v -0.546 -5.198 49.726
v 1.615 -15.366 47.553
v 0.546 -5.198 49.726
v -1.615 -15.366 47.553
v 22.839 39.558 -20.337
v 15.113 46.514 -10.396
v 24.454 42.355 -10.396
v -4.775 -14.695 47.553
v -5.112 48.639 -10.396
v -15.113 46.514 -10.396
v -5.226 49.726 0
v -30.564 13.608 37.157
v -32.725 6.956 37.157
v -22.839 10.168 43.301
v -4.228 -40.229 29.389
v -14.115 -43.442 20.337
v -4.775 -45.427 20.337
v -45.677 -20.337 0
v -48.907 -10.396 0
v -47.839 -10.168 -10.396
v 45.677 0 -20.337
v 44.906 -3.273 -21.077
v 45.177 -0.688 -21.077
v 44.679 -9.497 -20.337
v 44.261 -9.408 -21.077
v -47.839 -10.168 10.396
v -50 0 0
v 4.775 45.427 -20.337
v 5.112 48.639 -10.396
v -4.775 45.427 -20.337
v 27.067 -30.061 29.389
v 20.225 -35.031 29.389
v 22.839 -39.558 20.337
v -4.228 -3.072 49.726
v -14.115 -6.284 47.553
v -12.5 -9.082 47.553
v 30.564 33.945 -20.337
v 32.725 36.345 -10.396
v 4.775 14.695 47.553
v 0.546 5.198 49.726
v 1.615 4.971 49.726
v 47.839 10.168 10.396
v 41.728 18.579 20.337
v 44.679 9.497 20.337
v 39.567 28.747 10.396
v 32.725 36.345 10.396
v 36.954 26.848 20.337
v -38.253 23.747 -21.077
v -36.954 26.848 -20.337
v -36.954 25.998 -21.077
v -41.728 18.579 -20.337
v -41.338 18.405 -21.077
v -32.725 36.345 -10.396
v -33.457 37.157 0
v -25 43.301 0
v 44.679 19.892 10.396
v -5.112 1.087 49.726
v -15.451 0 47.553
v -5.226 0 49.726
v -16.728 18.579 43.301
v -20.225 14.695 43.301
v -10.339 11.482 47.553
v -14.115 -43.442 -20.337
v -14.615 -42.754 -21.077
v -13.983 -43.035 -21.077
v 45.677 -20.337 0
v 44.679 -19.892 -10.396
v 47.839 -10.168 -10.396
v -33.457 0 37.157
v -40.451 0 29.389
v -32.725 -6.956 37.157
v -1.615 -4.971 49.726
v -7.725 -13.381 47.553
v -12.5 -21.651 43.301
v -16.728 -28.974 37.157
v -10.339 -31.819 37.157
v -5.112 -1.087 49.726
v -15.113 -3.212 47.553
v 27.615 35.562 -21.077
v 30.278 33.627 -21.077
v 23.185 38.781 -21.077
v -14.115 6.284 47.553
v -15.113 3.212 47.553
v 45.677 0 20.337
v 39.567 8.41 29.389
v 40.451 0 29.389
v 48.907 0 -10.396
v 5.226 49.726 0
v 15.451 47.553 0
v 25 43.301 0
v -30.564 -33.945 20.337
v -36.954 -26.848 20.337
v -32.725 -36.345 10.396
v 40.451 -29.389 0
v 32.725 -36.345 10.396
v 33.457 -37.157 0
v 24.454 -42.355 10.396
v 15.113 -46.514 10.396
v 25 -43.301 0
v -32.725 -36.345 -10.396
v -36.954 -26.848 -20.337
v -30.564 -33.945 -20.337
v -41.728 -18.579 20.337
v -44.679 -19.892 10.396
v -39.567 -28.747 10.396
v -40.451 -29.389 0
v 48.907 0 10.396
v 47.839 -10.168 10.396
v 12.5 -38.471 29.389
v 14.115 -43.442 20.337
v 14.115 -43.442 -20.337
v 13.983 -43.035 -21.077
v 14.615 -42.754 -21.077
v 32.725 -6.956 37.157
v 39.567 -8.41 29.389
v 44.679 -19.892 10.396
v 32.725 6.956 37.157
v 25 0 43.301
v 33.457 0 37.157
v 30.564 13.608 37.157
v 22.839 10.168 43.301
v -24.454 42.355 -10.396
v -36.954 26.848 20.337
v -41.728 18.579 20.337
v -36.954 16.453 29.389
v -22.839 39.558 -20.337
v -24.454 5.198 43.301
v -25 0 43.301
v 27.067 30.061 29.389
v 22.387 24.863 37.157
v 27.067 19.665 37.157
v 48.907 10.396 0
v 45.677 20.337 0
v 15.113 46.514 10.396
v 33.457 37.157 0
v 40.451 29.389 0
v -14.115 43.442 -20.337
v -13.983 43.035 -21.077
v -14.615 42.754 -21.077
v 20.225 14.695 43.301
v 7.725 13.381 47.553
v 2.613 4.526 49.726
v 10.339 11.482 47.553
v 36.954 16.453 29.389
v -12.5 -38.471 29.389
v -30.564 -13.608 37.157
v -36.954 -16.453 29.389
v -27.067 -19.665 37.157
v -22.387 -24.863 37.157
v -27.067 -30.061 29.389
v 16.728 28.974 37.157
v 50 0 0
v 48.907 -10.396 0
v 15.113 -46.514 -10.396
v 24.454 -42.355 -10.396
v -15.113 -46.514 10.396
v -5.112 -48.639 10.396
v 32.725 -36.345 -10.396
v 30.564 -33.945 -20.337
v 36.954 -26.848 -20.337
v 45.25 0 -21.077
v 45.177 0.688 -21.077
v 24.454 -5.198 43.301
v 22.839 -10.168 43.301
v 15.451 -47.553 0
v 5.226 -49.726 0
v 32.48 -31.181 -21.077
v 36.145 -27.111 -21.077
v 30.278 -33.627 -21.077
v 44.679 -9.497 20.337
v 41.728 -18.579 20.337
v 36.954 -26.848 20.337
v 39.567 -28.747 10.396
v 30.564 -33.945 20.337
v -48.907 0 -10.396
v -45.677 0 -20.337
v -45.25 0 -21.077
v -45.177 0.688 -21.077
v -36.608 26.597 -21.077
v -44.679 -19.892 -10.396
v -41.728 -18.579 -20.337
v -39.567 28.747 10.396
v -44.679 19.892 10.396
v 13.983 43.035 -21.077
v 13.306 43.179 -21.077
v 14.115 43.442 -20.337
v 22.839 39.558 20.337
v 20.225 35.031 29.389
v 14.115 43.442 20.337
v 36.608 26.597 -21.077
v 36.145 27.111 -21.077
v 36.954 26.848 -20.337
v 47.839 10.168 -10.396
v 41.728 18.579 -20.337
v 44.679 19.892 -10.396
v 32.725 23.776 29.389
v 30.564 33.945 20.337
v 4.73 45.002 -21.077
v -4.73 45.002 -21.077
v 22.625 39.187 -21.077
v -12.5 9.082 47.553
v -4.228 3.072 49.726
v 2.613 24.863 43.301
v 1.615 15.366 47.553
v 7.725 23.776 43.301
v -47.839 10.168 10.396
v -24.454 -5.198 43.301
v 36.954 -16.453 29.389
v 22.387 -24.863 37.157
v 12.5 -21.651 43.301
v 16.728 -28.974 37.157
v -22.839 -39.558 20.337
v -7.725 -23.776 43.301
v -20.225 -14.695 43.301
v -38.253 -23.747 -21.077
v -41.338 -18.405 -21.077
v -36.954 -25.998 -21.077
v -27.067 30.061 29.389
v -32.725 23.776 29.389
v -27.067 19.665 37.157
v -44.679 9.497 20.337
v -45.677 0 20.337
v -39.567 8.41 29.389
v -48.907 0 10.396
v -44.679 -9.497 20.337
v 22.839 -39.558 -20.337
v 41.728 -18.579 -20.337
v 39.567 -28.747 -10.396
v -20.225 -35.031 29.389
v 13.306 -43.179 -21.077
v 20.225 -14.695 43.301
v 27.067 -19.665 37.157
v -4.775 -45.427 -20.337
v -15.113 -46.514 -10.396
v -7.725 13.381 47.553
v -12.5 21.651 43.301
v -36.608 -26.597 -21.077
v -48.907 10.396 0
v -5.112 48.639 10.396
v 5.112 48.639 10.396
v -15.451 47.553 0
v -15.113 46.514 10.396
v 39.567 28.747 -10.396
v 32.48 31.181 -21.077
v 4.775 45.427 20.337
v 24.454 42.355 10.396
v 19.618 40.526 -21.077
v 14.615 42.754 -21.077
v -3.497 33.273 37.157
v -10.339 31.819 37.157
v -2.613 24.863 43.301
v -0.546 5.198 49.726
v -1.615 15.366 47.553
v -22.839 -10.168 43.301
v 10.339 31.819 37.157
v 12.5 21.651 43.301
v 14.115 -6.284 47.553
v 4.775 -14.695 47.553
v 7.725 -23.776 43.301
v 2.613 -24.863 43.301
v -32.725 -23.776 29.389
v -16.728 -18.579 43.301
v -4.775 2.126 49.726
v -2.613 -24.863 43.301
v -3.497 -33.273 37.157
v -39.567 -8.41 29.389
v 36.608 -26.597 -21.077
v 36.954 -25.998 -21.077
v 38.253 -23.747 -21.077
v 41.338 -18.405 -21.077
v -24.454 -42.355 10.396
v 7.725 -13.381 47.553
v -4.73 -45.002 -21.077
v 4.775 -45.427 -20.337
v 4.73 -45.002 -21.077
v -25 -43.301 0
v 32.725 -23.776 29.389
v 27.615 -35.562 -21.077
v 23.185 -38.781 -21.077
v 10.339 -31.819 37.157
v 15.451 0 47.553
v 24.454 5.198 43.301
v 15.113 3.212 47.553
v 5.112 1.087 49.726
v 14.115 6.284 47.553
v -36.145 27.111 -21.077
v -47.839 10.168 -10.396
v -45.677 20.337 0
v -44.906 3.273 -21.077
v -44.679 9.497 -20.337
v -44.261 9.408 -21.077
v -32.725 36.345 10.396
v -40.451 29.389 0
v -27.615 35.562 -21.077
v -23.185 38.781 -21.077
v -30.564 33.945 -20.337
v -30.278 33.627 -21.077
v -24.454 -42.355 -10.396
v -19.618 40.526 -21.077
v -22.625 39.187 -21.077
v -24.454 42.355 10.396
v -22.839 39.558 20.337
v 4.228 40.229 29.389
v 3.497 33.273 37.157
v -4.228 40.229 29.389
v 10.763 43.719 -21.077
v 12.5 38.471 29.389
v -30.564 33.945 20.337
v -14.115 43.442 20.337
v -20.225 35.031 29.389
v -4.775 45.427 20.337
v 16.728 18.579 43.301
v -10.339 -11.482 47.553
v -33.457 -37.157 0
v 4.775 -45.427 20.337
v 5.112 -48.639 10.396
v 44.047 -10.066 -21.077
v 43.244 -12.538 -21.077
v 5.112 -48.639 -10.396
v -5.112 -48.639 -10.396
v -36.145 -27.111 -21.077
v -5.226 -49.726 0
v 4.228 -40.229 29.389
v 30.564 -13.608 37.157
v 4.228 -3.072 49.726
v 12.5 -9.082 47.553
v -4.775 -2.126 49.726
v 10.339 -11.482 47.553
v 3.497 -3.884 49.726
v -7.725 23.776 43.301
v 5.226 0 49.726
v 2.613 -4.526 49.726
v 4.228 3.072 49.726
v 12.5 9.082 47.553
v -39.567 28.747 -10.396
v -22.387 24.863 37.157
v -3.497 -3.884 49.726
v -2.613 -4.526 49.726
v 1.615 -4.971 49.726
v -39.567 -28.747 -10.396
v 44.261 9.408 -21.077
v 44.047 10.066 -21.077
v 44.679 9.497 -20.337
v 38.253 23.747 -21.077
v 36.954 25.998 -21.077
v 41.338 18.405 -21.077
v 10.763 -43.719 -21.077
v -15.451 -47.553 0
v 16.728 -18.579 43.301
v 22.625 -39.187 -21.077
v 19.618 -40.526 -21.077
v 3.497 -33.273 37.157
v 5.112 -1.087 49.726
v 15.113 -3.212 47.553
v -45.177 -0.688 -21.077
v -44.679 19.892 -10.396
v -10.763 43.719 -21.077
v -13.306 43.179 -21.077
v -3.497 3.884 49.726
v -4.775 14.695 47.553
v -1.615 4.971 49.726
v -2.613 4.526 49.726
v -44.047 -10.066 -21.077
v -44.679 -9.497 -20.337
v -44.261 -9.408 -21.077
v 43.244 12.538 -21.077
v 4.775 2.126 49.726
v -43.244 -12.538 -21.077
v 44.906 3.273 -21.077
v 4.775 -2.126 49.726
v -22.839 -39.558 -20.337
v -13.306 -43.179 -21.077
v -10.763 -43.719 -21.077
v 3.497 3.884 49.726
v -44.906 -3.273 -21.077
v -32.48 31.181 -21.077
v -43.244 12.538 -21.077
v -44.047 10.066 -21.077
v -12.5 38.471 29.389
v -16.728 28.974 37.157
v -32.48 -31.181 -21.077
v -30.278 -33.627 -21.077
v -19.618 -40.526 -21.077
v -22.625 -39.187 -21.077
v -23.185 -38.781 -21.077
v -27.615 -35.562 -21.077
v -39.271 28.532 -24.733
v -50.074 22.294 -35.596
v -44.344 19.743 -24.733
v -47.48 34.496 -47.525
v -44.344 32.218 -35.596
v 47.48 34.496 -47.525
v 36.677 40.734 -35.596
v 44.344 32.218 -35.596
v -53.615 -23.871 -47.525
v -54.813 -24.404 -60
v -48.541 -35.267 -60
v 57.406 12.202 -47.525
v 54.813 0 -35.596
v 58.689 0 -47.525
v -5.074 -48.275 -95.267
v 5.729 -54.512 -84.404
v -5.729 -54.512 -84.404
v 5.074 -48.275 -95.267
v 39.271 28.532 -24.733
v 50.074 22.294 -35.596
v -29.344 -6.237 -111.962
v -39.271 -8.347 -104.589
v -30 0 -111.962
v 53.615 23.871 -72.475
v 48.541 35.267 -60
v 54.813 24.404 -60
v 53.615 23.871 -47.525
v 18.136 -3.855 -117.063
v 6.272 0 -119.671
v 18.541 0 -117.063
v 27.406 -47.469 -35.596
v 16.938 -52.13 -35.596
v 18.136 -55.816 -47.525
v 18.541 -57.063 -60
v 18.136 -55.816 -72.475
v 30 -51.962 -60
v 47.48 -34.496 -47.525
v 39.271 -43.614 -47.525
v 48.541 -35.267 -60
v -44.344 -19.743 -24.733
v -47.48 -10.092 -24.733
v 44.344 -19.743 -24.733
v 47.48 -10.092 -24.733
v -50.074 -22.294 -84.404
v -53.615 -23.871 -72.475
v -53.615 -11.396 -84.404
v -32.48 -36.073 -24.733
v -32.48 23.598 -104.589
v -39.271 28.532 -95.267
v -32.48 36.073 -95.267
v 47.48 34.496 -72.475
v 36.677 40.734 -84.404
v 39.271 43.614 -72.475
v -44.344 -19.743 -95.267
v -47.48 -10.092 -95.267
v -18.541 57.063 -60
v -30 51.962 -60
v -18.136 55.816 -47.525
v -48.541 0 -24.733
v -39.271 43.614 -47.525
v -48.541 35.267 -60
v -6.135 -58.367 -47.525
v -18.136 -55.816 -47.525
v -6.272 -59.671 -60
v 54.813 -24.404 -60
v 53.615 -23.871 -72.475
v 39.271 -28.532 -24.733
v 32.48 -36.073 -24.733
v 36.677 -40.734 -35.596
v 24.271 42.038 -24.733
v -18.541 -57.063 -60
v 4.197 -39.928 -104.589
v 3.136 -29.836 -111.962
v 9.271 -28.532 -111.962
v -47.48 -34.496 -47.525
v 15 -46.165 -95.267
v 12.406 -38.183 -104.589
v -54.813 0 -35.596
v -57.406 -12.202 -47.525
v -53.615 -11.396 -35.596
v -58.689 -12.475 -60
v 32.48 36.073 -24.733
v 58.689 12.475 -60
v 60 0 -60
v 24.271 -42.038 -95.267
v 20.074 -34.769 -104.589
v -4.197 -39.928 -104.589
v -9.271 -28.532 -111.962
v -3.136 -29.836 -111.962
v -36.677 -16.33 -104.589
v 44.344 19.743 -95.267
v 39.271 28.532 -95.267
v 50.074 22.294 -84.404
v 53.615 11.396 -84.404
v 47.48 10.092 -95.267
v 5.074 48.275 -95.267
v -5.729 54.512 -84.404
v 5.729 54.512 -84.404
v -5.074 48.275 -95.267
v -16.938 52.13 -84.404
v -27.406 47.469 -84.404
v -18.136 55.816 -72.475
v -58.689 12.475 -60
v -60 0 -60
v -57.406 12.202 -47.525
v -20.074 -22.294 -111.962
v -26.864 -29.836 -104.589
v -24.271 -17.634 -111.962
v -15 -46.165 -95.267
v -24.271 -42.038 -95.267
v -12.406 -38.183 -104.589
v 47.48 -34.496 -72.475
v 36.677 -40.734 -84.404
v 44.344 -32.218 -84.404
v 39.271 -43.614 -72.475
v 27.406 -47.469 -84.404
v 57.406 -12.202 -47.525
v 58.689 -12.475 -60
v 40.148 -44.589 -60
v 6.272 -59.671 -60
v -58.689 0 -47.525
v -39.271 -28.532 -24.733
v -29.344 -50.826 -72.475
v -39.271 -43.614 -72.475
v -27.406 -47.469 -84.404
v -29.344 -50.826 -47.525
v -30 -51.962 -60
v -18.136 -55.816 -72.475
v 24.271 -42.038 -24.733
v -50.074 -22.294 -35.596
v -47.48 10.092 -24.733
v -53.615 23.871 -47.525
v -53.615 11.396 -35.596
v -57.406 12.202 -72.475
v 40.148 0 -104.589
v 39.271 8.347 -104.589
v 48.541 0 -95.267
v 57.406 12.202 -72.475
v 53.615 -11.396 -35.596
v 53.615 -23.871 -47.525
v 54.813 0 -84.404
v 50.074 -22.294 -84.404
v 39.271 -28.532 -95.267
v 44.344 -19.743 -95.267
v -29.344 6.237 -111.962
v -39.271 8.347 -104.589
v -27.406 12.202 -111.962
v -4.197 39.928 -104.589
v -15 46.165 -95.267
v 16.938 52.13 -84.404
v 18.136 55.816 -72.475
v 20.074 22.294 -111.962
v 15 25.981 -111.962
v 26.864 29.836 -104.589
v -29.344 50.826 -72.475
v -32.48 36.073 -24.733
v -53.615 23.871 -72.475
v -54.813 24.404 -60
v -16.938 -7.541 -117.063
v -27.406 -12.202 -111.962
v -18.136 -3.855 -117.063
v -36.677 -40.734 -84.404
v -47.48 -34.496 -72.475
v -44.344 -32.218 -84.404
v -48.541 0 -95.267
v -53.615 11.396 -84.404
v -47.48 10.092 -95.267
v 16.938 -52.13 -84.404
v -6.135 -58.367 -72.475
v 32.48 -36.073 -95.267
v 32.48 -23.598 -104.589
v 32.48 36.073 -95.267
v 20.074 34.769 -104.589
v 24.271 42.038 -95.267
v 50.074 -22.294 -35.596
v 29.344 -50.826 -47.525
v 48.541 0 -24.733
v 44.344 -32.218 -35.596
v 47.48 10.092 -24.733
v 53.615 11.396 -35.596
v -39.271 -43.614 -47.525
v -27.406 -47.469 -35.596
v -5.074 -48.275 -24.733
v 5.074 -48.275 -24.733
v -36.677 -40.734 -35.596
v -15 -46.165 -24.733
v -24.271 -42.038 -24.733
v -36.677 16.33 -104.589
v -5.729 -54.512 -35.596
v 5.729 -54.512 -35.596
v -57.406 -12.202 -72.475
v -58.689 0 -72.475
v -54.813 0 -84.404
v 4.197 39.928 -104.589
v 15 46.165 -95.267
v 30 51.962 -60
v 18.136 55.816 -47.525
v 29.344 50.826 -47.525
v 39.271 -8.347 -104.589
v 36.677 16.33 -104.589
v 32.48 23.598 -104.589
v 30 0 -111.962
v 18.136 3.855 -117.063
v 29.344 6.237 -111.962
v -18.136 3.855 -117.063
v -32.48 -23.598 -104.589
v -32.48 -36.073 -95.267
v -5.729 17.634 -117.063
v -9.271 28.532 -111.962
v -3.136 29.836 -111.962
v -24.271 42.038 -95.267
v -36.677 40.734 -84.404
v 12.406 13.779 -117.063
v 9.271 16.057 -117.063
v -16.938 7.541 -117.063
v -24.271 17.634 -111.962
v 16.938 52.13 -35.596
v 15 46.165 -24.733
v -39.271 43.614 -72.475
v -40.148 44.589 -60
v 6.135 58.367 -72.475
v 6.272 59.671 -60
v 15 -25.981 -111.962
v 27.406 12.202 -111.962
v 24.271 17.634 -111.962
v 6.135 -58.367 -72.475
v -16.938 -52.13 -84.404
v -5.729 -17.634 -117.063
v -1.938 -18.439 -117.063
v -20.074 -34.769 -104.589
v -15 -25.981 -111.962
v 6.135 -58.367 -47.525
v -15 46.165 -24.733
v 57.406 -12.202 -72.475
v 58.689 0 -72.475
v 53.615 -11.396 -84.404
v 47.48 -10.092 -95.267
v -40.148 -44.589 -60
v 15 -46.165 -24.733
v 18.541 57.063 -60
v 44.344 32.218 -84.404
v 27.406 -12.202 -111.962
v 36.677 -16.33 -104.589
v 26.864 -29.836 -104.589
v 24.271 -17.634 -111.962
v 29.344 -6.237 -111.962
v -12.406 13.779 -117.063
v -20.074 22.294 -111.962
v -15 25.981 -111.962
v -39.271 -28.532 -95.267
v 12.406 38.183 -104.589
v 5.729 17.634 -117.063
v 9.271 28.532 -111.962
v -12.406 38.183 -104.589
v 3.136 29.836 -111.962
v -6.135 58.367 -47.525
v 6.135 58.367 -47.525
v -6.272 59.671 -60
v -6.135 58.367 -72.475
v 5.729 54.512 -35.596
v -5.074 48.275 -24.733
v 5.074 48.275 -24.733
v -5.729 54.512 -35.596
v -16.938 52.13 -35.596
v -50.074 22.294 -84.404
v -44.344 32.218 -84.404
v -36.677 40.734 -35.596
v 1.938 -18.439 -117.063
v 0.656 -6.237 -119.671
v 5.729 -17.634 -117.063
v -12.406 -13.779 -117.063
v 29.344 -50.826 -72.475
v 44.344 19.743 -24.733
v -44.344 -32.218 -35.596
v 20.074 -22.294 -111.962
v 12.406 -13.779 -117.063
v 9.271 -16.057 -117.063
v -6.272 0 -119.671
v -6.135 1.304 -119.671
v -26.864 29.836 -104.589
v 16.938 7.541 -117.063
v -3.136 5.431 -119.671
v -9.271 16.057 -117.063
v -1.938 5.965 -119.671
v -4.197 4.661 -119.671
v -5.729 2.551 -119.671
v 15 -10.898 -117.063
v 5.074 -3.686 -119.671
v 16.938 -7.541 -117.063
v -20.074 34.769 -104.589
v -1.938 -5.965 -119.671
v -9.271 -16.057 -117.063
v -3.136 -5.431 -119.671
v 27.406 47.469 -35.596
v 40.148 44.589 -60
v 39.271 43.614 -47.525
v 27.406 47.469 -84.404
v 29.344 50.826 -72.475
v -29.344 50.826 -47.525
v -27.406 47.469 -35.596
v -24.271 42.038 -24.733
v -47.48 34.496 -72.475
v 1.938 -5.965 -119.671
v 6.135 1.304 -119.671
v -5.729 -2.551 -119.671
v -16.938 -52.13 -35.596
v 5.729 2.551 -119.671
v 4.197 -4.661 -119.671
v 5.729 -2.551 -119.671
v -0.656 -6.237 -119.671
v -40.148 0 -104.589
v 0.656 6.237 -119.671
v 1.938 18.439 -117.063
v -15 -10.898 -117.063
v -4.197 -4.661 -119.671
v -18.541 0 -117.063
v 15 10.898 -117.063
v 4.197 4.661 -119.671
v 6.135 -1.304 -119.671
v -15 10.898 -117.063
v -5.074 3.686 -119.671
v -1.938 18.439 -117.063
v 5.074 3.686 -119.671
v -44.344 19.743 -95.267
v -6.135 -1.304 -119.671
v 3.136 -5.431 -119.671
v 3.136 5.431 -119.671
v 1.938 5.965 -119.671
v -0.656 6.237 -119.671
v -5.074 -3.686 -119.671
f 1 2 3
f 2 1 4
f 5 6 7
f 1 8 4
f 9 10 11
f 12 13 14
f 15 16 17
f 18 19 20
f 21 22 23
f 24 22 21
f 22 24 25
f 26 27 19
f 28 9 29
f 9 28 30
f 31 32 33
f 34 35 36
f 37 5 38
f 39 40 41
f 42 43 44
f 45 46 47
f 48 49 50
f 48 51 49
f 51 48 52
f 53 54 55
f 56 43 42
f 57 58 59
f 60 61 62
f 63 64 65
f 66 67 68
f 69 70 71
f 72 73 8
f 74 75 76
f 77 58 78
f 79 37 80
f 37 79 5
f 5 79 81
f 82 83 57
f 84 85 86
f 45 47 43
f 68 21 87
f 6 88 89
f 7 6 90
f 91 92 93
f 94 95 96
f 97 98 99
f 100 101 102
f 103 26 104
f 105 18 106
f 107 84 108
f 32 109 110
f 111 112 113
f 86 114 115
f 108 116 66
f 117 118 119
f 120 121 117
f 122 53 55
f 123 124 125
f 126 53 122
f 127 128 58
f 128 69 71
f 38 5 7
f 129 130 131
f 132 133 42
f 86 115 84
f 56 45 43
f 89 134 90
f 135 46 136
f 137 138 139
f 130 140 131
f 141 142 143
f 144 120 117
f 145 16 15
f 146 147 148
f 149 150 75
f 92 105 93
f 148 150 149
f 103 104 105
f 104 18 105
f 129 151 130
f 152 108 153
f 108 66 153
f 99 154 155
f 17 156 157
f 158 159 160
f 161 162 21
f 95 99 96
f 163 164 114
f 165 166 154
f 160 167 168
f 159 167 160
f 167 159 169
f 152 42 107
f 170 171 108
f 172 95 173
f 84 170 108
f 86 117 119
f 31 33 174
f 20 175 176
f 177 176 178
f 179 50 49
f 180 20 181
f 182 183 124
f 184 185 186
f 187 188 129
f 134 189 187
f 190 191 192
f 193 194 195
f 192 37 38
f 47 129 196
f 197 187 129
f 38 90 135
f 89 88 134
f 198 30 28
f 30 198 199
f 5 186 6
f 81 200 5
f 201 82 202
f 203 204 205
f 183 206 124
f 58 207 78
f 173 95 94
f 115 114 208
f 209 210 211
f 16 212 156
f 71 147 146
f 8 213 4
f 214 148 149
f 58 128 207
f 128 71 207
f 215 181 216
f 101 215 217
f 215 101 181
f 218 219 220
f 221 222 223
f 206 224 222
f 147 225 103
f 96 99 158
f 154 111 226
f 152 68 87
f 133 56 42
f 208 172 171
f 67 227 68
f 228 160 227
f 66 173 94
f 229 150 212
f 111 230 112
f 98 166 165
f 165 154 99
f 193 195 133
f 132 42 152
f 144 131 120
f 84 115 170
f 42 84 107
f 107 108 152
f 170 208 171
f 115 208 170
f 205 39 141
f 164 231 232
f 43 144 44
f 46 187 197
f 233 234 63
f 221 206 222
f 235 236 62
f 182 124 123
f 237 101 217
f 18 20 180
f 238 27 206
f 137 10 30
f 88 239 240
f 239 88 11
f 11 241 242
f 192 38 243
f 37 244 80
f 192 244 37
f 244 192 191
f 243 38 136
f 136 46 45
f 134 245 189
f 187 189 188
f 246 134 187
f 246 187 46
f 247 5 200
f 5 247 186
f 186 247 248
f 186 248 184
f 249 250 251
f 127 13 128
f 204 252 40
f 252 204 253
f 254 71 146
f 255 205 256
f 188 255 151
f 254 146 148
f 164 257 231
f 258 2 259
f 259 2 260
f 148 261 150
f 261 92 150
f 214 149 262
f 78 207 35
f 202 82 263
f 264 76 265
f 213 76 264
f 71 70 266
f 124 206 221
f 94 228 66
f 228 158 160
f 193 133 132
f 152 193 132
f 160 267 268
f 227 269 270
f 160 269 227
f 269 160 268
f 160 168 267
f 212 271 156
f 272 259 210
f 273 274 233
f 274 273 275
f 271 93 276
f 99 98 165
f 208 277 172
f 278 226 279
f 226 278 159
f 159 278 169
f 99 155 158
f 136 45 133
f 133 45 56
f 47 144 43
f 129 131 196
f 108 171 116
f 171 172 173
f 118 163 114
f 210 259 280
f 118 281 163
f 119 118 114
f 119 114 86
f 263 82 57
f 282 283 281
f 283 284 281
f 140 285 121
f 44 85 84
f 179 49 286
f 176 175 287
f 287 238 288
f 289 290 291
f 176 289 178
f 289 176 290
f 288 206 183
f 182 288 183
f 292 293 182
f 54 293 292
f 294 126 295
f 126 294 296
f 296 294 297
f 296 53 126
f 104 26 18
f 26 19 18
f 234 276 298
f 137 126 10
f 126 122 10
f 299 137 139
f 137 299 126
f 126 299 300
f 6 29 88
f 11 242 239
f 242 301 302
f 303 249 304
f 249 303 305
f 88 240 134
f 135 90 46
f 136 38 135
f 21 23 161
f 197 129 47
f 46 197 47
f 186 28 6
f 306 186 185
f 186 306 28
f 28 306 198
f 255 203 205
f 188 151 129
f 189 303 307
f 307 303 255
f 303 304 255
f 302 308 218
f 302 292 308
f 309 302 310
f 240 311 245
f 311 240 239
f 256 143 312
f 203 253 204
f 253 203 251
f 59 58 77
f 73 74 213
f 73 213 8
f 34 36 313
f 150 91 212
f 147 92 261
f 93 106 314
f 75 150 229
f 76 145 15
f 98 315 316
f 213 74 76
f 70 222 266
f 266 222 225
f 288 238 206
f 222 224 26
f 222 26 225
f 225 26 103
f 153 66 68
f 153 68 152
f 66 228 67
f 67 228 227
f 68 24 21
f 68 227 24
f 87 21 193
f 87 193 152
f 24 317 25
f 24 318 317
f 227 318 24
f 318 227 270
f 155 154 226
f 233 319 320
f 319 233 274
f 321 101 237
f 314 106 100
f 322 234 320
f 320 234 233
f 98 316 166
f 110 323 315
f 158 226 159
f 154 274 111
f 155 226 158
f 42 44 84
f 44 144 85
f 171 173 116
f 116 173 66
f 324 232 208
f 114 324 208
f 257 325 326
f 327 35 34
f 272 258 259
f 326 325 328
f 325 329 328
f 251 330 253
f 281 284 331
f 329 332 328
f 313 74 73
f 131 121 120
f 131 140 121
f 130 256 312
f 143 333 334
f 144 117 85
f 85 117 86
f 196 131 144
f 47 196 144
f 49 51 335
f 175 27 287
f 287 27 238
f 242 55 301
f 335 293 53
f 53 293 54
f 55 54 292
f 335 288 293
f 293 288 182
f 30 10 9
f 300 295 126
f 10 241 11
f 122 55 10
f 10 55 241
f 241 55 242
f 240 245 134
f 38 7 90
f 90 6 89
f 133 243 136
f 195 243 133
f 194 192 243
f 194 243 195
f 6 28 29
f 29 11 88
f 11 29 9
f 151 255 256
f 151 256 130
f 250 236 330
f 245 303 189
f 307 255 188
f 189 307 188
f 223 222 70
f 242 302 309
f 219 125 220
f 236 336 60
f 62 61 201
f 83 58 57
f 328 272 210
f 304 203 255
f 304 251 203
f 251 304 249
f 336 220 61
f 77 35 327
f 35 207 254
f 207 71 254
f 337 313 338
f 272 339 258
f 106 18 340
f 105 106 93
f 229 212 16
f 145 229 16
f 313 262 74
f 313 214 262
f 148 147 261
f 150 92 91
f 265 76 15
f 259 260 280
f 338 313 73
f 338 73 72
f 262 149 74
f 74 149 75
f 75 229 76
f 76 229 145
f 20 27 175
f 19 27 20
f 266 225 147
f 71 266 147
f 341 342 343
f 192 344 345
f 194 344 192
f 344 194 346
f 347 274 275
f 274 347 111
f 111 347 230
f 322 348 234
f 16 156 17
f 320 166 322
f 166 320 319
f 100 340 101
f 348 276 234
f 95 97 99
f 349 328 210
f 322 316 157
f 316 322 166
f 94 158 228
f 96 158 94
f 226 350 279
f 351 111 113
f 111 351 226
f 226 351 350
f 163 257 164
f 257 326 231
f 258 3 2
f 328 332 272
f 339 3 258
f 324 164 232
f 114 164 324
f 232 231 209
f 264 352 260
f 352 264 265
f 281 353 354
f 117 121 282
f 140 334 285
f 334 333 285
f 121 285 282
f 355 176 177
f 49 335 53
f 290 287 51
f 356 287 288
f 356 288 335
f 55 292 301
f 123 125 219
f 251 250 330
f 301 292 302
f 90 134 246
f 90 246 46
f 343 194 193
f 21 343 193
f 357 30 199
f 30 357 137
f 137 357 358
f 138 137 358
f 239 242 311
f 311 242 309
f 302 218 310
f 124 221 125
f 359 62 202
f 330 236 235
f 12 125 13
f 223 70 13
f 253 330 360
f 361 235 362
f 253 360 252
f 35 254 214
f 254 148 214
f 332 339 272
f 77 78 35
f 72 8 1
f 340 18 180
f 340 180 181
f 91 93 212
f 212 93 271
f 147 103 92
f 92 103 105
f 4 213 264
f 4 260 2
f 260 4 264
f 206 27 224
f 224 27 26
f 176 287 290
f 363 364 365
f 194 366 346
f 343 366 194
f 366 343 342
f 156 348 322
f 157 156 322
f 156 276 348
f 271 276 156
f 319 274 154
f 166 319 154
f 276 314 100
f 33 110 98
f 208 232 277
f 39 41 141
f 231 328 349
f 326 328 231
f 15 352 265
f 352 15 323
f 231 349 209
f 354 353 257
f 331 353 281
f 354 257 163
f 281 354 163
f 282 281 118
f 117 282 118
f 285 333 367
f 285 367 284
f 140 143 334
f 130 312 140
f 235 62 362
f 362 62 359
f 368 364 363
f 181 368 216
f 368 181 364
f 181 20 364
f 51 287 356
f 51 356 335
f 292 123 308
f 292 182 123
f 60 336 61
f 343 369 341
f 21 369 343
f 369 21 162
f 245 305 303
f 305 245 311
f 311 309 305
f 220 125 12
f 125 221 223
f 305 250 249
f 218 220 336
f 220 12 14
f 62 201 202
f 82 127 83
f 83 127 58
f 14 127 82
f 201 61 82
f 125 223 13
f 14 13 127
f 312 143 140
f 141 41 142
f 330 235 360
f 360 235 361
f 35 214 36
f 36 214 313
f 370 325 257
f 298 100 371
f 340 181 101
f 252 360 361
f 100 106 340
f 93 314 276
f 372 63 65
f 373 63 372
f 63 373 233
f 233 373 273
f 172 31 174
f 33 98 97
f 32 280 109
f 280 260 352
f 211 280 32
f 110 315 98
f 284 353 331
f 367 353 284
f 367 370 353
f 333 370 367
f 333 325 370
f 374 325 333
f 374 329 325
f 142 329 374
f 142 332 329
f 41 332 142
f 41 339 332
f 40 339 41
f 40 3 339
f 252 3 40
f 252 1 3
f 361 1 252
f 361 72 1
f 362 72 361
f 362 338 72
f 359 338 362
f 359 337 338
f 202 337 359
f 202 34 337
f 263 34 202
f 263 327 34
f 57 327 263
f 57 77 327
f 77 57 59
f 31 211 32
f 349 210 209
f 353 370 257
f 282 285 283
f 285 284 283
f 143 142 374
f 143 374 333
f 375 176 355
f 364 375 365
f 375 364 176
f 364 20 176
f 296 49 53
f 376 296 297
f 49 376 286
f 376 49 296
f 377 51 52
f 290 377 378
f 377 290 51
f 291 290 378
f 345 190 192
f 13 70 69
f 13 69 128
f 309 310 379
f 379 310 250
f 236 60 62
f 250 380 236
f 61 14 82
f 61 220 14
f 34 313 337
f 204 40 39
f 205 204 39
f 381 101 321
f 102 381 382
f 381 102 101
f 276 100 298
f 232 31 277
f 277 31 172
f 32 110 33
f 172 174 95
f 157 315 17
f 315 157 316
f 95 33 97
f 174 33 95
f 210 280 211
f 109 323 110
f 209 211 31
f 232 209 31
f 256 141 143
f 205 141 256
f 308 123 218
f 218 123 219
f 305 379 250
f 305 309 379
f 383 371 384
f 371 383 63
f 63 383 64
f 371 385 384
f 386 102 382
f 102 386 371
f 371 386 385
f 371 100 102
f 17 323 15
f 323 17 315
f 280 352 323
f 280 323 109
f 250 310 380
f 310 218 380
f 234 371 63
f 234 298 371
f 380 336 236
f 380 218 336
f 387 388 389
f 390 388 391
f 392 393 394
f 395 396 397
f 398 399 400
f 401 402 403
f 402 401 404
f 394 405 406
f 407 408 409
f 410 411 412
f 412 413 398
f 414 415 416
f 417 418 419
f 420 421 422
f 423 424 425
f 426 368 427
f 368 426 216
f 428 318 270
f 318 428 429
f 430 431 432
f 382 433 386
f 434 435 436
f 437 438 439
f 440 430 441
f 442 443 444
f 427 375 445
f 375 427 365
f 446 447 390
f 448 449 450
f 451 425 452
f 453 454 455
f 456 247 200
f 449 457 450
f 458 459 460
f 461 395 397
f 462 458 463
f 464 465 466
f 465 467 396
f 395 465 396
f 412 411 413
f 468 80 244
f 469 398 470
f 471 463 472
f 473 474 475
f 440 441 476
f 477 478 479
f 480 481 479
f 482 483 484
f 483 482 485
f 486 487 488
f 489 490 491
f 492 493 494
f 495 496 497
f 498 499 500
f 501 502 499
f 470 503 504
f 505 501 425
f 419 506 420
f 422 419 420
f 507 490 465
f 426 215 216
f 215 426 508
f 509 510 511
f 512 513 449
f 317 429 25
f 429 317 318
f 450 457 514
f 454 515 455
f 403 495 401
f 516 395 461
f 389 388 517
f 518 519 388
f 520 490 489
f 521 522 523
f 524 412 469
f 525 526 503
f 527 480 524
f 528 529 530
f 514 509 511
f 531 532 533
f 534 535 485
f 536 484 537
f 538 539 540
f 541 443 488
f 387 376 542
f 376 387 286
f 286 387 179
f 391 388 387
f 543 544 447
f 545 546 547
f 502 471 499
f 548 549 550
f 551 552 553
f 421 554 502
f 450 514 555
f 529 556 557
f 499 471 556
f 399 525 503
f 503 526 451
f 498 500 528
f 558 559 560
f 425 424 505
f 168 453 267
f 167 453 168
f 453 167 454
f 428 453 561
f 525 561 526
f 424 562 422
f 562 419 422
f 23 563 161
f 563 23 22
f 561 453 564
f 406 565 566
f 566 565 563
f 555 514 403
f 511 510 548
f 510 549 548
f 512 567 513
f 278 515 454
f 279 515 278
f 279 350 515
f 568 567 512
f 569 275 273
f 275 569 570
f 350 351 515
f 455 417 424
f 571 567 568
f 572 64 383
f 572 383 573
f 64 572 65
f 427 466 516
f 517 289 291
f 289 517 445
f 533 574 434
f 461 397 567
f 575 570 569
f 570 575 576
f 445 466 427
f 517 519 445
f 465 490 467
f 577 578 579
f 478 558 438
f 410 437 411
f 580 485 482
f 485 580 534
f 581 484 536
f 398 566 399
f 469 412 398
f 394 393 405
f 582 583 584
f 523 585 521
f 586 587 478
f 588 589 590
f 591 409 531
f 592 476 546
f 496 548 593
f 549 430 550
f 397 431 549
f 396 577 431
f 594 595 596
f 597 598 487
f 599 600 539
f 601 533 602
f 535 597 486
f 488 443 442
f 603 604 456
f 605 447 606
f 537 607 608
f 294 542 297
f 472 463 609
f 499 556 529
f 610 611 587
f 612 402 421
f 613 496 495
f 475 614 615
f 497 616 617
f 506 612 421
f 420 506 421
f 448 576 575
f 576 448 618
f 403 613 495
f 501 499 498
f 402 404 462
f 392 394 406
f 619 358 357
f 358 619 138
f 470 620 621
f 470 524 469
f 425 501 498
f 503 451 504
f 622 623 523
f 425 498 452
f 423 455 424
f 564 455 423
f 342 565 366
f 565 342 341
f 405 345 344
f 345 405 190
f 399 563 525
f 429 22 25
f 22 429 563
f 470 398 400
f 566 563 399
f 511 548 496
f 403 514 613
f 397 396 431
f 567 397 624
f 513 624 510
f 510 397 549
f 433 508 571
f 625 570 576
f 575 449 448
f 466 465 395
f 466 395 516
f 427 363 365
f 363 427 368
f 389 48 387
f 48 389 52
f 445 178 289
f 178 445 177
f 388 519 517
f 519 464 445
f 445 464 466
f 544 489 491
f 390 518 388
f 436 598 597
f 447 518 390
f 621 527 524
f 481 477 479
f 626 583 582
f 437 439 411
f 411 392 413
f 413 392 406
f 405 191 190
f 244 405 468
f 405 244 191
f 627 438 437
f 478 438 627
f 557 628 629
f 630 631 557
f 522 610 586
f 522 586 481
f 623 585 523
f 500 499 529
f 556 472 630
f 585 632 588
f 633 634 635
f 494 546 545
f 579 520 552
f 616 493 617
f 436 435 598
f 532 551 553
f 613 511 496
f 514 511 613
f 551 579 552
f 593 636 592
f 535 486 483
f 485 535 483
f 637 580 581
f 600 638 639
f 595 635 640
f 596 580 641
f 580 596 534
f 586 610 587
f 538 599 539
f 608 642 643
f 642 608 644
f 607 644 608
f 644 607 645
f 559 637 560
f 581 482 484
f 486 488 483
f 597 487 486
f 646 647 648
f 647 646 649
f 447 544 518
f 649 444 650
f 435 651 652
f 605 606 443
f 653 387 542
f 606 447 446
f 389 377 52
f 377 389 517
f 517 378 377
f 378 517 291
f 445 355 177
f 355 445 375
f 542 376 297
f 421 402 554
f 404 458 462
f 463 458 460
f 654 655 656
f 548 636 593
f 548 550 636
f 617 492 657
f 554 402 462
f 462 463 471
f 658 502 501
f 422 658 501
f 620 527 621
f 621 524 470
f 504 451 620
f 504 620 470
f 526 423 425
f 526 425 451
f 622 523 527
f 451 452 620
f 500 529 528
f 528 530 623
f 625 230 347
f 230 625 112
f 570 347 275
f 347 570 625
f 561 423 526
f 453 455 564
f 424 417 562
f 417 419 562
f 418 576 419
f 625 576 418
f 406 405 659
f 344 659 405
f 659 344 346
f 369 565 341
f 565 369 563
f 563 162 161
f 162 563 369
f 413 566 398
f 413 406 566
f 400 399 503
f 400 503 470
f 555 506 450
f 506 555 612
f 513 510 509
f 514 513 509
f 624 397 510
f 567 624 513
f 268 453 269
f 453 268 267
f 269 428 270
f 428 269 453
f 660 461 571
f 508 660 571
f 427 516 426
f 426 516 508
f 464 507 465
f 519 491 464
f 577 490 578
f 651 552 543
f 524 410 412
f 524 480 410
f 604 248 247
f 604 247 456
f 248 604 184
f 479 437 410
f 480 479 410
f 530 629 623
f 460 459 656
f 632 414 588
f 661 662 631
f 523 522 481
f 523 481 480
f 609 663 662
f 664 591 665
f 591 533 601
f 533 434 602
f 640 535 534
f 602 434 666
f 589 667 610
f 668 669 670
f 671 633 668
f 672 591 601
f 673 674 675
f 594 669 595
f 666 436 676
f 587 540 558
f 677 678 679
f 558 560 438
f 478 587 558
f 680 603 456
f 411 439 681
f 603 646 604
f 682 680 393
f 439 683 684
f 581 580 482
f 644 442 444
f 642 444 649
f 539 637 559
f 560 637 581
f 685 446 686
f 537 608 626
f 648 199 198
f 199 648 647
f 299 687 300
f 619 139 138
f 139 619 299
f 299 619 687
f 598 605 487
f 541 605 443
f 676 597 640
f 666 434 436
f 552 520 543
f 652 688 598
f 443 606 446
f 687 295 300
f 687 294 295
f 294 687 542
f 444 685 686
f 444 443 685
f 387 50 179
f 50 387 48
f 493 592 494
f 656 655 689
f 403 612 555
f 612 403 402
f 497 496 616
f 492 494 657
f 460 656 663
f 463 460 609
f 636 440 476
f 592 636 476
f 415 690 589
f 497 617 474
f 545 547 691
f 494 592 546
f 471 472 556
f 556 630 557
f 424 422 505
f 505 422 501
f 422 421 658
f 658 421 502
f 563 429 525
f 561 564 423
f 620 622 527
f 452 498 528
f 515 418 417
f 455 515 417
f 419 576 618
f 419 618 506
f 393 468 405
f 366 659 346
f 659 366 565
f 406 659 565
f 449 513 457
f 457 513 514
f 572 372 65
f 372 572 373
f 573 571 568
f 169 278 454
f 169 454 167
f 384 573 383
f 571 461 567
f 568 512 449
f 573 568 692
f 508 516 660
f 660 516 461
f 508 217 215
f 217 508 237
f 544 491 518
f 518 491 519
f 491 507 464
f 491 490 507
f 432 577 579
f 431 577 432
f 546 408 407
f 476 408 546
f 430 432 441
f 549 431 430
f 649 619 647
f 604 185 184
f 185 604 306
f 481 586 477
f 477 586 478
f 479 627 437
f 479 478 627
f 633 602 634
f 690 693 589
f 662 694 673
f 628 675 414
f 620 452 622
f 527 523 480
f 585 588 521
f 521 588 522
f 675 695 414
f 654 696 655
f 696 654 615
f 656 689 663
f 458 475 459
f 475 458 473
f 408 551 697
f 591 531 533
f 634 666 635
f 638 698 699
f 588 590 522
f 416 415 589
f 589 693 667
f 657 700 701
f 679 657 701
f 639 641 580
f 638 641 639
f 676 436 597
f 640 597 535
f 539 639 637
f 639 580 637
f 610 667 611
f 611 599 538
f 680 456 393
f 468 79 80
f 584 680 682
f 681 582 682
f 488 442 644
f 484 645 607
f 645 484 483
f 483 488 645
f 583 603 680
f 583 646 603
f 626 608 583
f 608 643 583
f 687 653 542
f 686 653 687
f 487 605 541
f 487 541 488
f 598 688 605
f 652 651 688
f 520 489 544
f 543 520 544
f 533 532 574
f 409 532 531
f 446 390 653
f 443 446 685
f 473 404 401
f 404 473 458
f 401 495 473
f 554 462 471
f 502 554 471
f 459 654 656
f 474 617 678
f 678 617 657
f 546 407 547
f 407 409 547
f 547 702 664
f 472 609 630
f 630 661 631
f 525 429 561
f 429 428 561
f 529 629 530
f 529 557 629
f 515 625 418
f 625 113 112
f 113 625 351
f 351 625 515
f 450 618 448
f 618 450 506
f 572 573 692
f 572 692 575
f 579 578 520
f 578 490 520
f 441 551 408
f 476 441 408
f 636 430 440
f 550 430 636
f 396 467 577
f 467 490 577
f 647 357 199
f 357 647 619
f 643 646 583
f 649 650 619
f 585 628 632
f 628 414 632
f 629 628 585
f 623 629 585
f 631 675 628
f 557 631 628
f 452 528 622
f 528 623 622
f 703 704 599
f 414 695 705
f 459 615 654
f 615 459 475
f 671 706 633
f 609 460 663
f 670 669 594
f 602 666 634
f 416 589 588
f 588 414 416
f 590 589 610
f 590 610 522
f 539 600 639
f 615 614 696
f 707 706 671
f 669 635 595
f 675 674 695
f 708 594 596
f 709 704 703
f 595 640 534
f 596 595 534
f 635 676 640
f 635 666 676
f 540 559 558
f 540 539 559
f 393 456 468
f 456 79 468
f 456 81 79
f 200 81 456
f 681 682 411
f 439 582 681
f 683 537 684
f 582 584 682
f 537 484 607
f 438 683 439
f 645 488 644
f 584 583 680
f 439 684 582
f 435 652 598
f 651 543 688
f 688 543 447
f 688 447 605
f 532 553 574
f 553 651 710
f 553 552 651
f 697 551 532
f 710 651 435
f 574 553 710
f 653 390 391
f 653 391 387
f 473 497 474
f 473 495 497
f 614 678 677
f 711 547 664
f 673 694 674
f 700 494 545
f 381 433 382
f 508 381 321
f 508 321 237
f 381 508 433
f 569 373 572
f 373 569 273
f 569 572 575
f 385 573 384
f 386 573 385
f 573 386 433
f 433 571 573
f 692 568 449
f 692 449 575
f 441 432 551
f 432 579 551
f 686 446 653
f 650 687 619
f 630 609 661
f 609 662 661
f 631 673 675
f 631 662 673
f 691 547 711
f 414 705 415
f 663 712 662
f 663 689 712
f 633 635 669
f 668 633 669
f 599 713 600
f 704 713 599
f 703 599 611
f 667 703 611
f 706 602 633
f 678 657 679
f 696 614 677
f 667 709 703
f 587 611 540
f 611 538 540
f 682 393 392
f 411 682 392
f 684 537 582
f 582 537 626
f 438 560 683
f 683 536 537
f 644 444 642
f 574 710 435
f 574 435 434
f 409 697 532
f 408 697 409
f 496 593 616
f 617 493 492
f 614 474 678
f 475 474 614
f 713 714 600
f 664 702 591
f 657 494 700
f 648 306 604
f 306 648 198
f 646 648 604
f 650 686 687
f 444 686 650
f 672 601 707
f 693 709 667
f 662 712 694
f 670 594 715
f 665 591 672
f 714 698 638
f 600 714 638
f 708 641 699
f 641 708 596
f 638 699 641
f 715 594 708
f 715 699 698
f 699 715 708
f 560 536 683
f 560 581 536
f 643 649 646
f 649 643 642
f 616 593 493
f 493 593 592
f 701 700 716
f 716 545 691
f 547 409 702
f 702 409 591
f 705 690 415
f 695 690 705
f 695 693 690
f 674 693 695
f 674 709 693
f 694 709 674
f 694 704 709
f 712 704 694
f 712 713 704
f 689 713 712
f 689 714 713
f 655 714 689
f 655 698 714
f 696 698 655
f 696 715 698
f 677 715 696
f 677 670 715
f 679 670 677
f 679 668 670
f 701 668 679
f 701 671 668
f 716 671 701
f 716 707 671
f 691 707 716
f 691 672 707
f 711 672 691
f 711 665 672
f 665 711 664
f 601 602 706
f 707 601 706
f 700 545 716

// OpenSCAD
sizeA = 50;
sizeB = 60;

sphere(sizeA);
translate([0,0,-sizeB])
sphere(sizeB);
